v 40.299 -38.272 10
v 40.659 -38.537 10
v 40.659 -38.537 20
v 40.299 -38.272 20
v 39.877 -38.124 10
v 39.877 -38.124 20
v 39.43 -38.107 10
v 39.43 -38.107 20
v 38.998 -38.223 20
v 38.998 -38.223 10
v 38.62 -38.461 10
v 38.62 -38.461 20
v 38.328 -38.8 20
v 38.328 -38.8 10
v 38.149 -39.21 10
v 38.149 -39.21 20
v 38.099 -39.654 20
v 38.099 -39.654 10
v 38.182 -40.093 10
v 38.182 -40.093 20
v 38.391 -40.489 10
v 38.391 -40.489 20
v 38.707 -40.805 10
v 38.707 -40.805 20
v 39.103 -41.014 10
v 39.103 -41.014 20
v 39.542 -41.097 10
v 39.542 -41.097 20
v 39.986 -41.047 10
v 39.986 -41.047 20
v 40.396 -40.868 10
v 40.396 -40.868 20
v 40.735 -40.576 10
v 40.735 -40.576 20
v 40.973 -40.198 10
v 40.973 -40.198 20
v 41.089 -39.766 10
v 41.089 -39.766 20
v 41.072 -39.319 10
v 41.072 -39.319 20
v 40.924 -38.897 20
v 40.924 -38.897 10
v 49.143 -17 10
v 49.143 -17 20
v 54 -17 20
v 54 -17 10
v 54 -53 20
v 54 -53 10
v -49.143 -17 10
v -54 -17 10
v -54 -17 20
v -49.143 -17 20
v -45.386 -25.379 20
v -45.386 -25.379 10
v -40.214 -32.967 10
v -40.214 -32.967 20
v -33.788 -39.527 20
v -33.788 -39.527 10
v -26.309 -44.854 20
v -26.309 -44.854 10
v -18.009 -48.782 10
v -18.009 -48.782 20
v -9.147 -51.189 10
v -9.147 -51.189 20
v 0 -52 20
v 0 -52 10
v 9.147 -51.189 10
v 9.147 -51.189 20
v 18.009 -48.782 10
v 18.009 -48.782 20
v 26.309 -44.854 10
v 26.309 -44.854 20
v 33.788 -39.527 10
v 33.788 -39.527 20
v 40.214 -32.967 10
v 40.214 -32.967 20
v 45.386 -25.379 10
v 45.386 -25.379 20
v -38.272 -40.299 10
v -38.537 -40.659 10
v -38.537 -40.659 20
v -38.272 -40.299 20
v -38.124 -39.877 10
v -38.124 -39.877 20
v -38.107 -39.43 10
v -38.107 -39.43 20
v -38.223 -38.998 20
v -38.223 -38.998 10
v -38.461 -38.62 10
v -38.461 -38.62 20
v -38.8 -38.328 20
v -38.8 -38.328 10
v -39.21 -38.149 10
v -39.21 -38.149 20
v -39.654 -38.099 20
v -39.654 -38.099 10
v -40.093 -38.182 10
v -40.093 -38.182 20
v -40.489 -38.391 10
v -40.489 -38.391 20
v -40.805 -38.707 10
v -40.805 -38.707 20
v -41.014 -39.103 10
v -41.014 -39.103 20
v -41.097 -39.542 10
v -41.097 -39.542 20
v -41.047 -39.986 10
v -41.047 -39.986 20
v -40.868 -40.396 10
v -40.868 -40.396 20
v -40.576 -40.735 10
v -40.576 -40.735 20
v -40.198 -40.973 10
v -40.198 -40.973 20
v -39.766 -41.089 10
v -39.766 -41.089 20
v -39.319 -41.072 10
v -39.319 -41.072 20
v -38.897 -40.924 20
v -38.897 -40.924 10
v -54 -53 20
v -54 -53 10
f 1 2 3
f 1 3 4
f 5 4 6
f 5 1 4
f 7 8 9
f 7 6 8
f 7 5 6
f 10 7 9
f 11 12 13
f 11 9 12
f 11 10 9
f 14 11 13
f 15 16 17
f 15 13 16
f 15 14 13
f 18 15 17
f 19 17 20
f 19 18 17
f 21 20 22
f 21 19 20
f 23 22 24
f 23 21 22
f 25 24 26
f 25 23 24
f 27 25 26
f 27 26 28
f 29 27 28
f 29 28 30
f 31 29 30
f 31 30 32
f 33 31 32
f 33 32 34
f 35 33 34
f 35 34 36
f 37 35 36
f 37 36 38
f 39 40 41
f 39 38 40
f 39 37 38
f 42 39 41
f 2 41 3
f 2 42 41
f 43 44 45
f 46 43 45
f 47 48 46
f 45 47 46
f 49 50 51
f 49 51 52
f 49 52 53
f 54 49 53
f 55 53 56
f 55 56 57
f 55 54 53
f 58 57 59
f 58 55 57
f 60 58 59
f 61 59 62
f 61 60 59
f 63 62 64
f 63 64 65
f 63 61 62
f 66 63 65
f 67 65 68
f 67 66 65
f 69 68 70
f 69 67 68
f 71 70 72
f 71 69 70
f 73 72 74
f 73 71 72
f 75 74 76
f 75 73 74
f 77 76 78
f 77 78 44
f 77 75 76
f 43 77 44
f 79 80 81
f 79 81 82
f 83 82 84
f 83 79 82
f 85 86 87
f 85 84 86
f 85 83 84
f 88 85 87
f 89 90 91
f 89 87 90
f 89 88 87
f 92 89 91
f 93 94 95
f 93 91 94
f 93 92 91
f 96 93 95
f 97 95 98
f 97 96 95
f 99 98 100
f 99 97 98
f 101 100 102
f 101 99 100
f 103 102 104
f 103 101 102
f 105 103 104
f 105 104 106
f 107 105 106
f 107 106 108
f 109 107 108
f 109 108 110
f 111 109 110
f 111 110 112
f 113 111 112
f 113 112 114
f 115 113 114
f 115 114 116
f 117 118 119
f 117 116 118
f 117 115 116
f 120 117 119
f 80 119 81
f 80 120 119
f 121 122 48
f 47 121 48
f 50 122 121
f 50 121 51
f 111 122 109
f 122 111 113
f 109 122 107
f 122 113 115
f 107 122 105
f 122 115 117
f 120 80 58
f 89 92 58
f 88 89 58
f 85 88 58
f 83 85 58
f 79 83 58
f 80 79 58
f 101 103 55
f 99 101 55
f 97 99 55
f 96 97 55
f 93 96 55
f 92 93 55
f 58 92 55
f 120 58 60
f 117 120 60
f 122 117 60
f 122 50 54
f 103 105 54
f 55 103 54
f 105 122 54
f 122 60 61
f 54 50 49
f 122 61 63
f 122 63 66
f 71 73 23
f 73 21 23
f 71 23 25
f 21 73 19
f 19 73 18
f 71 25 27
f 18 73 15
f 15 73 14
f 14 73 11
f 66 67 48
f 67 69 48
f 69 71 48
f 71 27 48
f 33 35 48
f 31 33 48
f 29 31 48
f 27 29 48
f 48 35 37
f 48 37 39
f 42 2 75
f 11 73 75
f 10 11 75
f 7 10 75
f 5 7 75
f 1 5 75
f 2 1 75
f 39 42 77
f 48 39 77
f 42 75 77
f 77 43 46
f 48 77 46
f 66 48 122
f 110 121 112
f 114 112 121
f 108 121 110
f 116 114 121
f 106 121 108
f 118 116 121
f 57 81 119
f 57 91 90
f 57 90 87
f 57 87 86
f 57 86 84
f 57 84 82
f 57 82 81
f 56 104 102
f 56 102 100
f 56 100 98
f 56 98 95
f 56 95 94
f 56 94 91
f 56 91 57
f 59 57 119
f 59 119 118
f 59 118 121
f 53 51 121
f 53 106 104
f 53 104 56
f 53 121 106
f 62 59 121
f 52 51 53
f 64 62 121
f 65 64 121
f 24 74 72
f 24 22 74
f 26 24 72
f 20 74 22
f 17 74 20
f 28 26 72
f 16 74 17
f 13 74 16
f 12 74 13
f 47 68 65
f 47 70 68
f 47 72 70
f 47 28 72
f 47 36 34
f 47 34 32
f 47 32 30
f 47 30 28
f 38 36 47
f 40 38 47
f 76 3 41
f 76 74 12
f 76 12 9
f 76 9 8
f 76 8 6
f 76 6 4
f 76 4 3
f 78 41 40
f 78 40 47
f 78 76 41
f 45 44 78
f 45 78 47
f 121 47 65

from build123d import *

# Parameters (mm, degrees)
CYLINDER875_R               = 1.5
CYLINDER875_DEPTH           = 20
CYLINDER875_PLACEMENT_ANGLE = 45
CYLINDER866_R               = 1.5
CYLINDER866_DEPTH           = 20
CYLINDER869_R               = 1.5
CYLINDER869_DEPTH           = 20
CYLINDER869_PLACEMENT_ANGLE = 135
CYLINDER372_R               = 1.5
CYLINDER372_DEPTH           = 20
CYLINDER377_R               = 1.5
CYLINDER377_DEPTH           = 20
CYLINDER377_PLACEMENT_ANGLE = 225
CYLINDER876_R               = 1.5
CYLINDER876_DEPTH           = 20
CYLINDER873_R               = 1.5
CYLINDER873_DEPTH           = 20
CYLINDER873_PLACEMENT_ANGLE = 45
CYLINDER874_R               = 1.5
CYLINDER874_DEPTH           = 20
CYLINDER867_R               = 52
CYLINDER867_DEPTH           = 10
BOX134_W                    = 108
BOX134_H                    = 36
BOX134_DEPTH                = 10


with BuildPart() as v_lec875:
    # Cylinder875 → Cylinder875 (new body)
    with BuildSketch(Plane.XY):
        Circle(CYLINDER875_R)
    extrude(amount=CYLINDER875_DEPTH)


with BuildPart() as v_lec875_1:
    # Cylinder875 placement: moved
    add(v_lec875.part.moved(Location((39.59798, -39.59798, 2))).rotate(Axis((39.59798, -39.59798, 2), (0, 0, 1)), CYLINDER875_PLACEMENT_ANGLE))


with BuildPart() as v_lec866:
    # Cylinder866 → Cylinder866 (new body)
    with BuildSketch(Plane(origin=(56, 0, 2), x_dir=(0, 1, 0), z_dir=(0, 0, 1))):
        Circle(CYLINDER866_R)
    extrude(amount=CYLINDER866_DEPTH)


with BuildPart() as v_lec869:
    # Cylinder869 → Cylinder869 (new body)
    with BuildSketch(Plane.XY):
        Circle(CYLINDER869_R)
    extrude(amount=CYLINDER869_DEPTH)


with BuildPart() as v_lec869_1:
    # Cylinder869 placement: moved
    add(v_lec869.part.moved(Location((39.59798, 39.59798, 2))).rotate(Axis((39.59798, 39.59798, 2), (0, 0, 1)), CYLINDER869_PLACEMENT_ANGLE))


with BuildPart() as v_lec372:
    # Cylinder372 → Cylinder372 (new body)
    with BuildSketch(Plane(origin=(0, 56, 2), x_dir=(-1, 0, 0), z_dir=(0, 0, 1))):
        Circle(CYLINDER372_R)
    extrude(amount=CYLINDER372_DEPTH)


with BuildPart() as v_lec377:
    # Cylinder377 → Cylinder377 (new body)
    with BuildSketch(Plane.XY):
        Circle(CYLINDER377_R)
    extrude(amount=CYLINDER377_DEPTH)


with BuildPart() as v_lec377_1:
    # Cylinder377 placement: moved
    add(v_lec377.part.moved(Location((-39.59798, 39.59798, 2))).rotate(Axis((-39.59798, 39.59798, 2), (0, 0, 1)), CYLINDER377_PLACEMENT_ANGLE))


with BuildPart() as v_lec876:
    # Cylinder876 → Cylinder876 (new body)
    with BuildSketch(Plane(origin=(-56, 0, 2), x_dir=(0, -1, 0), z_dir=(0, 0, 1))):
        Circle(CYLINDER876_R)
    extrude(amount=CYLINDER876_DEPTH)


with BuildPart() as v_lec873:
    # Cylinder873 → Cylinder873 (new body)
    with BuildSketch(Plane.XY):
        Circle(CYLINDER873_R)
    extrude(amount=CYLINDER873_DEPTH)


with BuildPart() as v_lec873_1:
    # Cylinder873 placement: moved
    add(v_lec873.part.moved(Location((-39.59798, -39.59798, 2))).rotate(Axis((-39.59798, -39.59798, 2), (0, 0, -1)), CYLINDER873_PLACEMENT_ANGLE))


with BuildPart() as compound262:
    # Cylinder874 → Cylinder874 (new body)
    with BuildSketch(Plane(origin=(0, -56, 2), x_dir=(1, 0, 0), z_dir=(0, 0, 1))):
        Circle(CYLINDER874_R)
    extrude(amount=CYLINDER874_DEPTH)

    # Compound262: union Válec875, Válec866, Válec869, Válec372, Válec377, Válec876, Válec873
    add(v_lec875_1.part)
    add(v_lec866.part)
    add(v_lec869_1.part)
    add(v_lec372.part)
    add(v_lec377_1.part)
    add(v_lec876.part)
    add(v_lec873_1.part)


with BuildPart() as v_lec867:
    # Cylinder867 → Cylinder867 (new body)
    with BuildSketch(Plane.XY.offset(20)):
        Circle(CYLINDER867_R)
    extrude(amount=CYLINDER867_DEPTH)


with BuildPart() as cut151:
    # Box134 → Box134 (new body)
    with BuildSketch(Plane(origin=(-54, -53, 20), x_dir=(1, 0, 0), z_dir=(0, 0, 1))):
        with Locations((54, 18)):
            Rectangle(BOX134_W, BOX134_H)
    extrude(amount=BOX134_DEPTH)

    # Cut152: cut Válec867
    add(v_lec867.part, mode=Mode.SUBTRACT)


with BuildPart() as cut151_1:
    # Cut152 placement: moved
    add(cut151.part.moved(Location((0, 0, -10))))

    # Cut151: cut Compound262
    add(compound262.part, mode=Mode.SUBTRACT)


solid = cut151_1.part
